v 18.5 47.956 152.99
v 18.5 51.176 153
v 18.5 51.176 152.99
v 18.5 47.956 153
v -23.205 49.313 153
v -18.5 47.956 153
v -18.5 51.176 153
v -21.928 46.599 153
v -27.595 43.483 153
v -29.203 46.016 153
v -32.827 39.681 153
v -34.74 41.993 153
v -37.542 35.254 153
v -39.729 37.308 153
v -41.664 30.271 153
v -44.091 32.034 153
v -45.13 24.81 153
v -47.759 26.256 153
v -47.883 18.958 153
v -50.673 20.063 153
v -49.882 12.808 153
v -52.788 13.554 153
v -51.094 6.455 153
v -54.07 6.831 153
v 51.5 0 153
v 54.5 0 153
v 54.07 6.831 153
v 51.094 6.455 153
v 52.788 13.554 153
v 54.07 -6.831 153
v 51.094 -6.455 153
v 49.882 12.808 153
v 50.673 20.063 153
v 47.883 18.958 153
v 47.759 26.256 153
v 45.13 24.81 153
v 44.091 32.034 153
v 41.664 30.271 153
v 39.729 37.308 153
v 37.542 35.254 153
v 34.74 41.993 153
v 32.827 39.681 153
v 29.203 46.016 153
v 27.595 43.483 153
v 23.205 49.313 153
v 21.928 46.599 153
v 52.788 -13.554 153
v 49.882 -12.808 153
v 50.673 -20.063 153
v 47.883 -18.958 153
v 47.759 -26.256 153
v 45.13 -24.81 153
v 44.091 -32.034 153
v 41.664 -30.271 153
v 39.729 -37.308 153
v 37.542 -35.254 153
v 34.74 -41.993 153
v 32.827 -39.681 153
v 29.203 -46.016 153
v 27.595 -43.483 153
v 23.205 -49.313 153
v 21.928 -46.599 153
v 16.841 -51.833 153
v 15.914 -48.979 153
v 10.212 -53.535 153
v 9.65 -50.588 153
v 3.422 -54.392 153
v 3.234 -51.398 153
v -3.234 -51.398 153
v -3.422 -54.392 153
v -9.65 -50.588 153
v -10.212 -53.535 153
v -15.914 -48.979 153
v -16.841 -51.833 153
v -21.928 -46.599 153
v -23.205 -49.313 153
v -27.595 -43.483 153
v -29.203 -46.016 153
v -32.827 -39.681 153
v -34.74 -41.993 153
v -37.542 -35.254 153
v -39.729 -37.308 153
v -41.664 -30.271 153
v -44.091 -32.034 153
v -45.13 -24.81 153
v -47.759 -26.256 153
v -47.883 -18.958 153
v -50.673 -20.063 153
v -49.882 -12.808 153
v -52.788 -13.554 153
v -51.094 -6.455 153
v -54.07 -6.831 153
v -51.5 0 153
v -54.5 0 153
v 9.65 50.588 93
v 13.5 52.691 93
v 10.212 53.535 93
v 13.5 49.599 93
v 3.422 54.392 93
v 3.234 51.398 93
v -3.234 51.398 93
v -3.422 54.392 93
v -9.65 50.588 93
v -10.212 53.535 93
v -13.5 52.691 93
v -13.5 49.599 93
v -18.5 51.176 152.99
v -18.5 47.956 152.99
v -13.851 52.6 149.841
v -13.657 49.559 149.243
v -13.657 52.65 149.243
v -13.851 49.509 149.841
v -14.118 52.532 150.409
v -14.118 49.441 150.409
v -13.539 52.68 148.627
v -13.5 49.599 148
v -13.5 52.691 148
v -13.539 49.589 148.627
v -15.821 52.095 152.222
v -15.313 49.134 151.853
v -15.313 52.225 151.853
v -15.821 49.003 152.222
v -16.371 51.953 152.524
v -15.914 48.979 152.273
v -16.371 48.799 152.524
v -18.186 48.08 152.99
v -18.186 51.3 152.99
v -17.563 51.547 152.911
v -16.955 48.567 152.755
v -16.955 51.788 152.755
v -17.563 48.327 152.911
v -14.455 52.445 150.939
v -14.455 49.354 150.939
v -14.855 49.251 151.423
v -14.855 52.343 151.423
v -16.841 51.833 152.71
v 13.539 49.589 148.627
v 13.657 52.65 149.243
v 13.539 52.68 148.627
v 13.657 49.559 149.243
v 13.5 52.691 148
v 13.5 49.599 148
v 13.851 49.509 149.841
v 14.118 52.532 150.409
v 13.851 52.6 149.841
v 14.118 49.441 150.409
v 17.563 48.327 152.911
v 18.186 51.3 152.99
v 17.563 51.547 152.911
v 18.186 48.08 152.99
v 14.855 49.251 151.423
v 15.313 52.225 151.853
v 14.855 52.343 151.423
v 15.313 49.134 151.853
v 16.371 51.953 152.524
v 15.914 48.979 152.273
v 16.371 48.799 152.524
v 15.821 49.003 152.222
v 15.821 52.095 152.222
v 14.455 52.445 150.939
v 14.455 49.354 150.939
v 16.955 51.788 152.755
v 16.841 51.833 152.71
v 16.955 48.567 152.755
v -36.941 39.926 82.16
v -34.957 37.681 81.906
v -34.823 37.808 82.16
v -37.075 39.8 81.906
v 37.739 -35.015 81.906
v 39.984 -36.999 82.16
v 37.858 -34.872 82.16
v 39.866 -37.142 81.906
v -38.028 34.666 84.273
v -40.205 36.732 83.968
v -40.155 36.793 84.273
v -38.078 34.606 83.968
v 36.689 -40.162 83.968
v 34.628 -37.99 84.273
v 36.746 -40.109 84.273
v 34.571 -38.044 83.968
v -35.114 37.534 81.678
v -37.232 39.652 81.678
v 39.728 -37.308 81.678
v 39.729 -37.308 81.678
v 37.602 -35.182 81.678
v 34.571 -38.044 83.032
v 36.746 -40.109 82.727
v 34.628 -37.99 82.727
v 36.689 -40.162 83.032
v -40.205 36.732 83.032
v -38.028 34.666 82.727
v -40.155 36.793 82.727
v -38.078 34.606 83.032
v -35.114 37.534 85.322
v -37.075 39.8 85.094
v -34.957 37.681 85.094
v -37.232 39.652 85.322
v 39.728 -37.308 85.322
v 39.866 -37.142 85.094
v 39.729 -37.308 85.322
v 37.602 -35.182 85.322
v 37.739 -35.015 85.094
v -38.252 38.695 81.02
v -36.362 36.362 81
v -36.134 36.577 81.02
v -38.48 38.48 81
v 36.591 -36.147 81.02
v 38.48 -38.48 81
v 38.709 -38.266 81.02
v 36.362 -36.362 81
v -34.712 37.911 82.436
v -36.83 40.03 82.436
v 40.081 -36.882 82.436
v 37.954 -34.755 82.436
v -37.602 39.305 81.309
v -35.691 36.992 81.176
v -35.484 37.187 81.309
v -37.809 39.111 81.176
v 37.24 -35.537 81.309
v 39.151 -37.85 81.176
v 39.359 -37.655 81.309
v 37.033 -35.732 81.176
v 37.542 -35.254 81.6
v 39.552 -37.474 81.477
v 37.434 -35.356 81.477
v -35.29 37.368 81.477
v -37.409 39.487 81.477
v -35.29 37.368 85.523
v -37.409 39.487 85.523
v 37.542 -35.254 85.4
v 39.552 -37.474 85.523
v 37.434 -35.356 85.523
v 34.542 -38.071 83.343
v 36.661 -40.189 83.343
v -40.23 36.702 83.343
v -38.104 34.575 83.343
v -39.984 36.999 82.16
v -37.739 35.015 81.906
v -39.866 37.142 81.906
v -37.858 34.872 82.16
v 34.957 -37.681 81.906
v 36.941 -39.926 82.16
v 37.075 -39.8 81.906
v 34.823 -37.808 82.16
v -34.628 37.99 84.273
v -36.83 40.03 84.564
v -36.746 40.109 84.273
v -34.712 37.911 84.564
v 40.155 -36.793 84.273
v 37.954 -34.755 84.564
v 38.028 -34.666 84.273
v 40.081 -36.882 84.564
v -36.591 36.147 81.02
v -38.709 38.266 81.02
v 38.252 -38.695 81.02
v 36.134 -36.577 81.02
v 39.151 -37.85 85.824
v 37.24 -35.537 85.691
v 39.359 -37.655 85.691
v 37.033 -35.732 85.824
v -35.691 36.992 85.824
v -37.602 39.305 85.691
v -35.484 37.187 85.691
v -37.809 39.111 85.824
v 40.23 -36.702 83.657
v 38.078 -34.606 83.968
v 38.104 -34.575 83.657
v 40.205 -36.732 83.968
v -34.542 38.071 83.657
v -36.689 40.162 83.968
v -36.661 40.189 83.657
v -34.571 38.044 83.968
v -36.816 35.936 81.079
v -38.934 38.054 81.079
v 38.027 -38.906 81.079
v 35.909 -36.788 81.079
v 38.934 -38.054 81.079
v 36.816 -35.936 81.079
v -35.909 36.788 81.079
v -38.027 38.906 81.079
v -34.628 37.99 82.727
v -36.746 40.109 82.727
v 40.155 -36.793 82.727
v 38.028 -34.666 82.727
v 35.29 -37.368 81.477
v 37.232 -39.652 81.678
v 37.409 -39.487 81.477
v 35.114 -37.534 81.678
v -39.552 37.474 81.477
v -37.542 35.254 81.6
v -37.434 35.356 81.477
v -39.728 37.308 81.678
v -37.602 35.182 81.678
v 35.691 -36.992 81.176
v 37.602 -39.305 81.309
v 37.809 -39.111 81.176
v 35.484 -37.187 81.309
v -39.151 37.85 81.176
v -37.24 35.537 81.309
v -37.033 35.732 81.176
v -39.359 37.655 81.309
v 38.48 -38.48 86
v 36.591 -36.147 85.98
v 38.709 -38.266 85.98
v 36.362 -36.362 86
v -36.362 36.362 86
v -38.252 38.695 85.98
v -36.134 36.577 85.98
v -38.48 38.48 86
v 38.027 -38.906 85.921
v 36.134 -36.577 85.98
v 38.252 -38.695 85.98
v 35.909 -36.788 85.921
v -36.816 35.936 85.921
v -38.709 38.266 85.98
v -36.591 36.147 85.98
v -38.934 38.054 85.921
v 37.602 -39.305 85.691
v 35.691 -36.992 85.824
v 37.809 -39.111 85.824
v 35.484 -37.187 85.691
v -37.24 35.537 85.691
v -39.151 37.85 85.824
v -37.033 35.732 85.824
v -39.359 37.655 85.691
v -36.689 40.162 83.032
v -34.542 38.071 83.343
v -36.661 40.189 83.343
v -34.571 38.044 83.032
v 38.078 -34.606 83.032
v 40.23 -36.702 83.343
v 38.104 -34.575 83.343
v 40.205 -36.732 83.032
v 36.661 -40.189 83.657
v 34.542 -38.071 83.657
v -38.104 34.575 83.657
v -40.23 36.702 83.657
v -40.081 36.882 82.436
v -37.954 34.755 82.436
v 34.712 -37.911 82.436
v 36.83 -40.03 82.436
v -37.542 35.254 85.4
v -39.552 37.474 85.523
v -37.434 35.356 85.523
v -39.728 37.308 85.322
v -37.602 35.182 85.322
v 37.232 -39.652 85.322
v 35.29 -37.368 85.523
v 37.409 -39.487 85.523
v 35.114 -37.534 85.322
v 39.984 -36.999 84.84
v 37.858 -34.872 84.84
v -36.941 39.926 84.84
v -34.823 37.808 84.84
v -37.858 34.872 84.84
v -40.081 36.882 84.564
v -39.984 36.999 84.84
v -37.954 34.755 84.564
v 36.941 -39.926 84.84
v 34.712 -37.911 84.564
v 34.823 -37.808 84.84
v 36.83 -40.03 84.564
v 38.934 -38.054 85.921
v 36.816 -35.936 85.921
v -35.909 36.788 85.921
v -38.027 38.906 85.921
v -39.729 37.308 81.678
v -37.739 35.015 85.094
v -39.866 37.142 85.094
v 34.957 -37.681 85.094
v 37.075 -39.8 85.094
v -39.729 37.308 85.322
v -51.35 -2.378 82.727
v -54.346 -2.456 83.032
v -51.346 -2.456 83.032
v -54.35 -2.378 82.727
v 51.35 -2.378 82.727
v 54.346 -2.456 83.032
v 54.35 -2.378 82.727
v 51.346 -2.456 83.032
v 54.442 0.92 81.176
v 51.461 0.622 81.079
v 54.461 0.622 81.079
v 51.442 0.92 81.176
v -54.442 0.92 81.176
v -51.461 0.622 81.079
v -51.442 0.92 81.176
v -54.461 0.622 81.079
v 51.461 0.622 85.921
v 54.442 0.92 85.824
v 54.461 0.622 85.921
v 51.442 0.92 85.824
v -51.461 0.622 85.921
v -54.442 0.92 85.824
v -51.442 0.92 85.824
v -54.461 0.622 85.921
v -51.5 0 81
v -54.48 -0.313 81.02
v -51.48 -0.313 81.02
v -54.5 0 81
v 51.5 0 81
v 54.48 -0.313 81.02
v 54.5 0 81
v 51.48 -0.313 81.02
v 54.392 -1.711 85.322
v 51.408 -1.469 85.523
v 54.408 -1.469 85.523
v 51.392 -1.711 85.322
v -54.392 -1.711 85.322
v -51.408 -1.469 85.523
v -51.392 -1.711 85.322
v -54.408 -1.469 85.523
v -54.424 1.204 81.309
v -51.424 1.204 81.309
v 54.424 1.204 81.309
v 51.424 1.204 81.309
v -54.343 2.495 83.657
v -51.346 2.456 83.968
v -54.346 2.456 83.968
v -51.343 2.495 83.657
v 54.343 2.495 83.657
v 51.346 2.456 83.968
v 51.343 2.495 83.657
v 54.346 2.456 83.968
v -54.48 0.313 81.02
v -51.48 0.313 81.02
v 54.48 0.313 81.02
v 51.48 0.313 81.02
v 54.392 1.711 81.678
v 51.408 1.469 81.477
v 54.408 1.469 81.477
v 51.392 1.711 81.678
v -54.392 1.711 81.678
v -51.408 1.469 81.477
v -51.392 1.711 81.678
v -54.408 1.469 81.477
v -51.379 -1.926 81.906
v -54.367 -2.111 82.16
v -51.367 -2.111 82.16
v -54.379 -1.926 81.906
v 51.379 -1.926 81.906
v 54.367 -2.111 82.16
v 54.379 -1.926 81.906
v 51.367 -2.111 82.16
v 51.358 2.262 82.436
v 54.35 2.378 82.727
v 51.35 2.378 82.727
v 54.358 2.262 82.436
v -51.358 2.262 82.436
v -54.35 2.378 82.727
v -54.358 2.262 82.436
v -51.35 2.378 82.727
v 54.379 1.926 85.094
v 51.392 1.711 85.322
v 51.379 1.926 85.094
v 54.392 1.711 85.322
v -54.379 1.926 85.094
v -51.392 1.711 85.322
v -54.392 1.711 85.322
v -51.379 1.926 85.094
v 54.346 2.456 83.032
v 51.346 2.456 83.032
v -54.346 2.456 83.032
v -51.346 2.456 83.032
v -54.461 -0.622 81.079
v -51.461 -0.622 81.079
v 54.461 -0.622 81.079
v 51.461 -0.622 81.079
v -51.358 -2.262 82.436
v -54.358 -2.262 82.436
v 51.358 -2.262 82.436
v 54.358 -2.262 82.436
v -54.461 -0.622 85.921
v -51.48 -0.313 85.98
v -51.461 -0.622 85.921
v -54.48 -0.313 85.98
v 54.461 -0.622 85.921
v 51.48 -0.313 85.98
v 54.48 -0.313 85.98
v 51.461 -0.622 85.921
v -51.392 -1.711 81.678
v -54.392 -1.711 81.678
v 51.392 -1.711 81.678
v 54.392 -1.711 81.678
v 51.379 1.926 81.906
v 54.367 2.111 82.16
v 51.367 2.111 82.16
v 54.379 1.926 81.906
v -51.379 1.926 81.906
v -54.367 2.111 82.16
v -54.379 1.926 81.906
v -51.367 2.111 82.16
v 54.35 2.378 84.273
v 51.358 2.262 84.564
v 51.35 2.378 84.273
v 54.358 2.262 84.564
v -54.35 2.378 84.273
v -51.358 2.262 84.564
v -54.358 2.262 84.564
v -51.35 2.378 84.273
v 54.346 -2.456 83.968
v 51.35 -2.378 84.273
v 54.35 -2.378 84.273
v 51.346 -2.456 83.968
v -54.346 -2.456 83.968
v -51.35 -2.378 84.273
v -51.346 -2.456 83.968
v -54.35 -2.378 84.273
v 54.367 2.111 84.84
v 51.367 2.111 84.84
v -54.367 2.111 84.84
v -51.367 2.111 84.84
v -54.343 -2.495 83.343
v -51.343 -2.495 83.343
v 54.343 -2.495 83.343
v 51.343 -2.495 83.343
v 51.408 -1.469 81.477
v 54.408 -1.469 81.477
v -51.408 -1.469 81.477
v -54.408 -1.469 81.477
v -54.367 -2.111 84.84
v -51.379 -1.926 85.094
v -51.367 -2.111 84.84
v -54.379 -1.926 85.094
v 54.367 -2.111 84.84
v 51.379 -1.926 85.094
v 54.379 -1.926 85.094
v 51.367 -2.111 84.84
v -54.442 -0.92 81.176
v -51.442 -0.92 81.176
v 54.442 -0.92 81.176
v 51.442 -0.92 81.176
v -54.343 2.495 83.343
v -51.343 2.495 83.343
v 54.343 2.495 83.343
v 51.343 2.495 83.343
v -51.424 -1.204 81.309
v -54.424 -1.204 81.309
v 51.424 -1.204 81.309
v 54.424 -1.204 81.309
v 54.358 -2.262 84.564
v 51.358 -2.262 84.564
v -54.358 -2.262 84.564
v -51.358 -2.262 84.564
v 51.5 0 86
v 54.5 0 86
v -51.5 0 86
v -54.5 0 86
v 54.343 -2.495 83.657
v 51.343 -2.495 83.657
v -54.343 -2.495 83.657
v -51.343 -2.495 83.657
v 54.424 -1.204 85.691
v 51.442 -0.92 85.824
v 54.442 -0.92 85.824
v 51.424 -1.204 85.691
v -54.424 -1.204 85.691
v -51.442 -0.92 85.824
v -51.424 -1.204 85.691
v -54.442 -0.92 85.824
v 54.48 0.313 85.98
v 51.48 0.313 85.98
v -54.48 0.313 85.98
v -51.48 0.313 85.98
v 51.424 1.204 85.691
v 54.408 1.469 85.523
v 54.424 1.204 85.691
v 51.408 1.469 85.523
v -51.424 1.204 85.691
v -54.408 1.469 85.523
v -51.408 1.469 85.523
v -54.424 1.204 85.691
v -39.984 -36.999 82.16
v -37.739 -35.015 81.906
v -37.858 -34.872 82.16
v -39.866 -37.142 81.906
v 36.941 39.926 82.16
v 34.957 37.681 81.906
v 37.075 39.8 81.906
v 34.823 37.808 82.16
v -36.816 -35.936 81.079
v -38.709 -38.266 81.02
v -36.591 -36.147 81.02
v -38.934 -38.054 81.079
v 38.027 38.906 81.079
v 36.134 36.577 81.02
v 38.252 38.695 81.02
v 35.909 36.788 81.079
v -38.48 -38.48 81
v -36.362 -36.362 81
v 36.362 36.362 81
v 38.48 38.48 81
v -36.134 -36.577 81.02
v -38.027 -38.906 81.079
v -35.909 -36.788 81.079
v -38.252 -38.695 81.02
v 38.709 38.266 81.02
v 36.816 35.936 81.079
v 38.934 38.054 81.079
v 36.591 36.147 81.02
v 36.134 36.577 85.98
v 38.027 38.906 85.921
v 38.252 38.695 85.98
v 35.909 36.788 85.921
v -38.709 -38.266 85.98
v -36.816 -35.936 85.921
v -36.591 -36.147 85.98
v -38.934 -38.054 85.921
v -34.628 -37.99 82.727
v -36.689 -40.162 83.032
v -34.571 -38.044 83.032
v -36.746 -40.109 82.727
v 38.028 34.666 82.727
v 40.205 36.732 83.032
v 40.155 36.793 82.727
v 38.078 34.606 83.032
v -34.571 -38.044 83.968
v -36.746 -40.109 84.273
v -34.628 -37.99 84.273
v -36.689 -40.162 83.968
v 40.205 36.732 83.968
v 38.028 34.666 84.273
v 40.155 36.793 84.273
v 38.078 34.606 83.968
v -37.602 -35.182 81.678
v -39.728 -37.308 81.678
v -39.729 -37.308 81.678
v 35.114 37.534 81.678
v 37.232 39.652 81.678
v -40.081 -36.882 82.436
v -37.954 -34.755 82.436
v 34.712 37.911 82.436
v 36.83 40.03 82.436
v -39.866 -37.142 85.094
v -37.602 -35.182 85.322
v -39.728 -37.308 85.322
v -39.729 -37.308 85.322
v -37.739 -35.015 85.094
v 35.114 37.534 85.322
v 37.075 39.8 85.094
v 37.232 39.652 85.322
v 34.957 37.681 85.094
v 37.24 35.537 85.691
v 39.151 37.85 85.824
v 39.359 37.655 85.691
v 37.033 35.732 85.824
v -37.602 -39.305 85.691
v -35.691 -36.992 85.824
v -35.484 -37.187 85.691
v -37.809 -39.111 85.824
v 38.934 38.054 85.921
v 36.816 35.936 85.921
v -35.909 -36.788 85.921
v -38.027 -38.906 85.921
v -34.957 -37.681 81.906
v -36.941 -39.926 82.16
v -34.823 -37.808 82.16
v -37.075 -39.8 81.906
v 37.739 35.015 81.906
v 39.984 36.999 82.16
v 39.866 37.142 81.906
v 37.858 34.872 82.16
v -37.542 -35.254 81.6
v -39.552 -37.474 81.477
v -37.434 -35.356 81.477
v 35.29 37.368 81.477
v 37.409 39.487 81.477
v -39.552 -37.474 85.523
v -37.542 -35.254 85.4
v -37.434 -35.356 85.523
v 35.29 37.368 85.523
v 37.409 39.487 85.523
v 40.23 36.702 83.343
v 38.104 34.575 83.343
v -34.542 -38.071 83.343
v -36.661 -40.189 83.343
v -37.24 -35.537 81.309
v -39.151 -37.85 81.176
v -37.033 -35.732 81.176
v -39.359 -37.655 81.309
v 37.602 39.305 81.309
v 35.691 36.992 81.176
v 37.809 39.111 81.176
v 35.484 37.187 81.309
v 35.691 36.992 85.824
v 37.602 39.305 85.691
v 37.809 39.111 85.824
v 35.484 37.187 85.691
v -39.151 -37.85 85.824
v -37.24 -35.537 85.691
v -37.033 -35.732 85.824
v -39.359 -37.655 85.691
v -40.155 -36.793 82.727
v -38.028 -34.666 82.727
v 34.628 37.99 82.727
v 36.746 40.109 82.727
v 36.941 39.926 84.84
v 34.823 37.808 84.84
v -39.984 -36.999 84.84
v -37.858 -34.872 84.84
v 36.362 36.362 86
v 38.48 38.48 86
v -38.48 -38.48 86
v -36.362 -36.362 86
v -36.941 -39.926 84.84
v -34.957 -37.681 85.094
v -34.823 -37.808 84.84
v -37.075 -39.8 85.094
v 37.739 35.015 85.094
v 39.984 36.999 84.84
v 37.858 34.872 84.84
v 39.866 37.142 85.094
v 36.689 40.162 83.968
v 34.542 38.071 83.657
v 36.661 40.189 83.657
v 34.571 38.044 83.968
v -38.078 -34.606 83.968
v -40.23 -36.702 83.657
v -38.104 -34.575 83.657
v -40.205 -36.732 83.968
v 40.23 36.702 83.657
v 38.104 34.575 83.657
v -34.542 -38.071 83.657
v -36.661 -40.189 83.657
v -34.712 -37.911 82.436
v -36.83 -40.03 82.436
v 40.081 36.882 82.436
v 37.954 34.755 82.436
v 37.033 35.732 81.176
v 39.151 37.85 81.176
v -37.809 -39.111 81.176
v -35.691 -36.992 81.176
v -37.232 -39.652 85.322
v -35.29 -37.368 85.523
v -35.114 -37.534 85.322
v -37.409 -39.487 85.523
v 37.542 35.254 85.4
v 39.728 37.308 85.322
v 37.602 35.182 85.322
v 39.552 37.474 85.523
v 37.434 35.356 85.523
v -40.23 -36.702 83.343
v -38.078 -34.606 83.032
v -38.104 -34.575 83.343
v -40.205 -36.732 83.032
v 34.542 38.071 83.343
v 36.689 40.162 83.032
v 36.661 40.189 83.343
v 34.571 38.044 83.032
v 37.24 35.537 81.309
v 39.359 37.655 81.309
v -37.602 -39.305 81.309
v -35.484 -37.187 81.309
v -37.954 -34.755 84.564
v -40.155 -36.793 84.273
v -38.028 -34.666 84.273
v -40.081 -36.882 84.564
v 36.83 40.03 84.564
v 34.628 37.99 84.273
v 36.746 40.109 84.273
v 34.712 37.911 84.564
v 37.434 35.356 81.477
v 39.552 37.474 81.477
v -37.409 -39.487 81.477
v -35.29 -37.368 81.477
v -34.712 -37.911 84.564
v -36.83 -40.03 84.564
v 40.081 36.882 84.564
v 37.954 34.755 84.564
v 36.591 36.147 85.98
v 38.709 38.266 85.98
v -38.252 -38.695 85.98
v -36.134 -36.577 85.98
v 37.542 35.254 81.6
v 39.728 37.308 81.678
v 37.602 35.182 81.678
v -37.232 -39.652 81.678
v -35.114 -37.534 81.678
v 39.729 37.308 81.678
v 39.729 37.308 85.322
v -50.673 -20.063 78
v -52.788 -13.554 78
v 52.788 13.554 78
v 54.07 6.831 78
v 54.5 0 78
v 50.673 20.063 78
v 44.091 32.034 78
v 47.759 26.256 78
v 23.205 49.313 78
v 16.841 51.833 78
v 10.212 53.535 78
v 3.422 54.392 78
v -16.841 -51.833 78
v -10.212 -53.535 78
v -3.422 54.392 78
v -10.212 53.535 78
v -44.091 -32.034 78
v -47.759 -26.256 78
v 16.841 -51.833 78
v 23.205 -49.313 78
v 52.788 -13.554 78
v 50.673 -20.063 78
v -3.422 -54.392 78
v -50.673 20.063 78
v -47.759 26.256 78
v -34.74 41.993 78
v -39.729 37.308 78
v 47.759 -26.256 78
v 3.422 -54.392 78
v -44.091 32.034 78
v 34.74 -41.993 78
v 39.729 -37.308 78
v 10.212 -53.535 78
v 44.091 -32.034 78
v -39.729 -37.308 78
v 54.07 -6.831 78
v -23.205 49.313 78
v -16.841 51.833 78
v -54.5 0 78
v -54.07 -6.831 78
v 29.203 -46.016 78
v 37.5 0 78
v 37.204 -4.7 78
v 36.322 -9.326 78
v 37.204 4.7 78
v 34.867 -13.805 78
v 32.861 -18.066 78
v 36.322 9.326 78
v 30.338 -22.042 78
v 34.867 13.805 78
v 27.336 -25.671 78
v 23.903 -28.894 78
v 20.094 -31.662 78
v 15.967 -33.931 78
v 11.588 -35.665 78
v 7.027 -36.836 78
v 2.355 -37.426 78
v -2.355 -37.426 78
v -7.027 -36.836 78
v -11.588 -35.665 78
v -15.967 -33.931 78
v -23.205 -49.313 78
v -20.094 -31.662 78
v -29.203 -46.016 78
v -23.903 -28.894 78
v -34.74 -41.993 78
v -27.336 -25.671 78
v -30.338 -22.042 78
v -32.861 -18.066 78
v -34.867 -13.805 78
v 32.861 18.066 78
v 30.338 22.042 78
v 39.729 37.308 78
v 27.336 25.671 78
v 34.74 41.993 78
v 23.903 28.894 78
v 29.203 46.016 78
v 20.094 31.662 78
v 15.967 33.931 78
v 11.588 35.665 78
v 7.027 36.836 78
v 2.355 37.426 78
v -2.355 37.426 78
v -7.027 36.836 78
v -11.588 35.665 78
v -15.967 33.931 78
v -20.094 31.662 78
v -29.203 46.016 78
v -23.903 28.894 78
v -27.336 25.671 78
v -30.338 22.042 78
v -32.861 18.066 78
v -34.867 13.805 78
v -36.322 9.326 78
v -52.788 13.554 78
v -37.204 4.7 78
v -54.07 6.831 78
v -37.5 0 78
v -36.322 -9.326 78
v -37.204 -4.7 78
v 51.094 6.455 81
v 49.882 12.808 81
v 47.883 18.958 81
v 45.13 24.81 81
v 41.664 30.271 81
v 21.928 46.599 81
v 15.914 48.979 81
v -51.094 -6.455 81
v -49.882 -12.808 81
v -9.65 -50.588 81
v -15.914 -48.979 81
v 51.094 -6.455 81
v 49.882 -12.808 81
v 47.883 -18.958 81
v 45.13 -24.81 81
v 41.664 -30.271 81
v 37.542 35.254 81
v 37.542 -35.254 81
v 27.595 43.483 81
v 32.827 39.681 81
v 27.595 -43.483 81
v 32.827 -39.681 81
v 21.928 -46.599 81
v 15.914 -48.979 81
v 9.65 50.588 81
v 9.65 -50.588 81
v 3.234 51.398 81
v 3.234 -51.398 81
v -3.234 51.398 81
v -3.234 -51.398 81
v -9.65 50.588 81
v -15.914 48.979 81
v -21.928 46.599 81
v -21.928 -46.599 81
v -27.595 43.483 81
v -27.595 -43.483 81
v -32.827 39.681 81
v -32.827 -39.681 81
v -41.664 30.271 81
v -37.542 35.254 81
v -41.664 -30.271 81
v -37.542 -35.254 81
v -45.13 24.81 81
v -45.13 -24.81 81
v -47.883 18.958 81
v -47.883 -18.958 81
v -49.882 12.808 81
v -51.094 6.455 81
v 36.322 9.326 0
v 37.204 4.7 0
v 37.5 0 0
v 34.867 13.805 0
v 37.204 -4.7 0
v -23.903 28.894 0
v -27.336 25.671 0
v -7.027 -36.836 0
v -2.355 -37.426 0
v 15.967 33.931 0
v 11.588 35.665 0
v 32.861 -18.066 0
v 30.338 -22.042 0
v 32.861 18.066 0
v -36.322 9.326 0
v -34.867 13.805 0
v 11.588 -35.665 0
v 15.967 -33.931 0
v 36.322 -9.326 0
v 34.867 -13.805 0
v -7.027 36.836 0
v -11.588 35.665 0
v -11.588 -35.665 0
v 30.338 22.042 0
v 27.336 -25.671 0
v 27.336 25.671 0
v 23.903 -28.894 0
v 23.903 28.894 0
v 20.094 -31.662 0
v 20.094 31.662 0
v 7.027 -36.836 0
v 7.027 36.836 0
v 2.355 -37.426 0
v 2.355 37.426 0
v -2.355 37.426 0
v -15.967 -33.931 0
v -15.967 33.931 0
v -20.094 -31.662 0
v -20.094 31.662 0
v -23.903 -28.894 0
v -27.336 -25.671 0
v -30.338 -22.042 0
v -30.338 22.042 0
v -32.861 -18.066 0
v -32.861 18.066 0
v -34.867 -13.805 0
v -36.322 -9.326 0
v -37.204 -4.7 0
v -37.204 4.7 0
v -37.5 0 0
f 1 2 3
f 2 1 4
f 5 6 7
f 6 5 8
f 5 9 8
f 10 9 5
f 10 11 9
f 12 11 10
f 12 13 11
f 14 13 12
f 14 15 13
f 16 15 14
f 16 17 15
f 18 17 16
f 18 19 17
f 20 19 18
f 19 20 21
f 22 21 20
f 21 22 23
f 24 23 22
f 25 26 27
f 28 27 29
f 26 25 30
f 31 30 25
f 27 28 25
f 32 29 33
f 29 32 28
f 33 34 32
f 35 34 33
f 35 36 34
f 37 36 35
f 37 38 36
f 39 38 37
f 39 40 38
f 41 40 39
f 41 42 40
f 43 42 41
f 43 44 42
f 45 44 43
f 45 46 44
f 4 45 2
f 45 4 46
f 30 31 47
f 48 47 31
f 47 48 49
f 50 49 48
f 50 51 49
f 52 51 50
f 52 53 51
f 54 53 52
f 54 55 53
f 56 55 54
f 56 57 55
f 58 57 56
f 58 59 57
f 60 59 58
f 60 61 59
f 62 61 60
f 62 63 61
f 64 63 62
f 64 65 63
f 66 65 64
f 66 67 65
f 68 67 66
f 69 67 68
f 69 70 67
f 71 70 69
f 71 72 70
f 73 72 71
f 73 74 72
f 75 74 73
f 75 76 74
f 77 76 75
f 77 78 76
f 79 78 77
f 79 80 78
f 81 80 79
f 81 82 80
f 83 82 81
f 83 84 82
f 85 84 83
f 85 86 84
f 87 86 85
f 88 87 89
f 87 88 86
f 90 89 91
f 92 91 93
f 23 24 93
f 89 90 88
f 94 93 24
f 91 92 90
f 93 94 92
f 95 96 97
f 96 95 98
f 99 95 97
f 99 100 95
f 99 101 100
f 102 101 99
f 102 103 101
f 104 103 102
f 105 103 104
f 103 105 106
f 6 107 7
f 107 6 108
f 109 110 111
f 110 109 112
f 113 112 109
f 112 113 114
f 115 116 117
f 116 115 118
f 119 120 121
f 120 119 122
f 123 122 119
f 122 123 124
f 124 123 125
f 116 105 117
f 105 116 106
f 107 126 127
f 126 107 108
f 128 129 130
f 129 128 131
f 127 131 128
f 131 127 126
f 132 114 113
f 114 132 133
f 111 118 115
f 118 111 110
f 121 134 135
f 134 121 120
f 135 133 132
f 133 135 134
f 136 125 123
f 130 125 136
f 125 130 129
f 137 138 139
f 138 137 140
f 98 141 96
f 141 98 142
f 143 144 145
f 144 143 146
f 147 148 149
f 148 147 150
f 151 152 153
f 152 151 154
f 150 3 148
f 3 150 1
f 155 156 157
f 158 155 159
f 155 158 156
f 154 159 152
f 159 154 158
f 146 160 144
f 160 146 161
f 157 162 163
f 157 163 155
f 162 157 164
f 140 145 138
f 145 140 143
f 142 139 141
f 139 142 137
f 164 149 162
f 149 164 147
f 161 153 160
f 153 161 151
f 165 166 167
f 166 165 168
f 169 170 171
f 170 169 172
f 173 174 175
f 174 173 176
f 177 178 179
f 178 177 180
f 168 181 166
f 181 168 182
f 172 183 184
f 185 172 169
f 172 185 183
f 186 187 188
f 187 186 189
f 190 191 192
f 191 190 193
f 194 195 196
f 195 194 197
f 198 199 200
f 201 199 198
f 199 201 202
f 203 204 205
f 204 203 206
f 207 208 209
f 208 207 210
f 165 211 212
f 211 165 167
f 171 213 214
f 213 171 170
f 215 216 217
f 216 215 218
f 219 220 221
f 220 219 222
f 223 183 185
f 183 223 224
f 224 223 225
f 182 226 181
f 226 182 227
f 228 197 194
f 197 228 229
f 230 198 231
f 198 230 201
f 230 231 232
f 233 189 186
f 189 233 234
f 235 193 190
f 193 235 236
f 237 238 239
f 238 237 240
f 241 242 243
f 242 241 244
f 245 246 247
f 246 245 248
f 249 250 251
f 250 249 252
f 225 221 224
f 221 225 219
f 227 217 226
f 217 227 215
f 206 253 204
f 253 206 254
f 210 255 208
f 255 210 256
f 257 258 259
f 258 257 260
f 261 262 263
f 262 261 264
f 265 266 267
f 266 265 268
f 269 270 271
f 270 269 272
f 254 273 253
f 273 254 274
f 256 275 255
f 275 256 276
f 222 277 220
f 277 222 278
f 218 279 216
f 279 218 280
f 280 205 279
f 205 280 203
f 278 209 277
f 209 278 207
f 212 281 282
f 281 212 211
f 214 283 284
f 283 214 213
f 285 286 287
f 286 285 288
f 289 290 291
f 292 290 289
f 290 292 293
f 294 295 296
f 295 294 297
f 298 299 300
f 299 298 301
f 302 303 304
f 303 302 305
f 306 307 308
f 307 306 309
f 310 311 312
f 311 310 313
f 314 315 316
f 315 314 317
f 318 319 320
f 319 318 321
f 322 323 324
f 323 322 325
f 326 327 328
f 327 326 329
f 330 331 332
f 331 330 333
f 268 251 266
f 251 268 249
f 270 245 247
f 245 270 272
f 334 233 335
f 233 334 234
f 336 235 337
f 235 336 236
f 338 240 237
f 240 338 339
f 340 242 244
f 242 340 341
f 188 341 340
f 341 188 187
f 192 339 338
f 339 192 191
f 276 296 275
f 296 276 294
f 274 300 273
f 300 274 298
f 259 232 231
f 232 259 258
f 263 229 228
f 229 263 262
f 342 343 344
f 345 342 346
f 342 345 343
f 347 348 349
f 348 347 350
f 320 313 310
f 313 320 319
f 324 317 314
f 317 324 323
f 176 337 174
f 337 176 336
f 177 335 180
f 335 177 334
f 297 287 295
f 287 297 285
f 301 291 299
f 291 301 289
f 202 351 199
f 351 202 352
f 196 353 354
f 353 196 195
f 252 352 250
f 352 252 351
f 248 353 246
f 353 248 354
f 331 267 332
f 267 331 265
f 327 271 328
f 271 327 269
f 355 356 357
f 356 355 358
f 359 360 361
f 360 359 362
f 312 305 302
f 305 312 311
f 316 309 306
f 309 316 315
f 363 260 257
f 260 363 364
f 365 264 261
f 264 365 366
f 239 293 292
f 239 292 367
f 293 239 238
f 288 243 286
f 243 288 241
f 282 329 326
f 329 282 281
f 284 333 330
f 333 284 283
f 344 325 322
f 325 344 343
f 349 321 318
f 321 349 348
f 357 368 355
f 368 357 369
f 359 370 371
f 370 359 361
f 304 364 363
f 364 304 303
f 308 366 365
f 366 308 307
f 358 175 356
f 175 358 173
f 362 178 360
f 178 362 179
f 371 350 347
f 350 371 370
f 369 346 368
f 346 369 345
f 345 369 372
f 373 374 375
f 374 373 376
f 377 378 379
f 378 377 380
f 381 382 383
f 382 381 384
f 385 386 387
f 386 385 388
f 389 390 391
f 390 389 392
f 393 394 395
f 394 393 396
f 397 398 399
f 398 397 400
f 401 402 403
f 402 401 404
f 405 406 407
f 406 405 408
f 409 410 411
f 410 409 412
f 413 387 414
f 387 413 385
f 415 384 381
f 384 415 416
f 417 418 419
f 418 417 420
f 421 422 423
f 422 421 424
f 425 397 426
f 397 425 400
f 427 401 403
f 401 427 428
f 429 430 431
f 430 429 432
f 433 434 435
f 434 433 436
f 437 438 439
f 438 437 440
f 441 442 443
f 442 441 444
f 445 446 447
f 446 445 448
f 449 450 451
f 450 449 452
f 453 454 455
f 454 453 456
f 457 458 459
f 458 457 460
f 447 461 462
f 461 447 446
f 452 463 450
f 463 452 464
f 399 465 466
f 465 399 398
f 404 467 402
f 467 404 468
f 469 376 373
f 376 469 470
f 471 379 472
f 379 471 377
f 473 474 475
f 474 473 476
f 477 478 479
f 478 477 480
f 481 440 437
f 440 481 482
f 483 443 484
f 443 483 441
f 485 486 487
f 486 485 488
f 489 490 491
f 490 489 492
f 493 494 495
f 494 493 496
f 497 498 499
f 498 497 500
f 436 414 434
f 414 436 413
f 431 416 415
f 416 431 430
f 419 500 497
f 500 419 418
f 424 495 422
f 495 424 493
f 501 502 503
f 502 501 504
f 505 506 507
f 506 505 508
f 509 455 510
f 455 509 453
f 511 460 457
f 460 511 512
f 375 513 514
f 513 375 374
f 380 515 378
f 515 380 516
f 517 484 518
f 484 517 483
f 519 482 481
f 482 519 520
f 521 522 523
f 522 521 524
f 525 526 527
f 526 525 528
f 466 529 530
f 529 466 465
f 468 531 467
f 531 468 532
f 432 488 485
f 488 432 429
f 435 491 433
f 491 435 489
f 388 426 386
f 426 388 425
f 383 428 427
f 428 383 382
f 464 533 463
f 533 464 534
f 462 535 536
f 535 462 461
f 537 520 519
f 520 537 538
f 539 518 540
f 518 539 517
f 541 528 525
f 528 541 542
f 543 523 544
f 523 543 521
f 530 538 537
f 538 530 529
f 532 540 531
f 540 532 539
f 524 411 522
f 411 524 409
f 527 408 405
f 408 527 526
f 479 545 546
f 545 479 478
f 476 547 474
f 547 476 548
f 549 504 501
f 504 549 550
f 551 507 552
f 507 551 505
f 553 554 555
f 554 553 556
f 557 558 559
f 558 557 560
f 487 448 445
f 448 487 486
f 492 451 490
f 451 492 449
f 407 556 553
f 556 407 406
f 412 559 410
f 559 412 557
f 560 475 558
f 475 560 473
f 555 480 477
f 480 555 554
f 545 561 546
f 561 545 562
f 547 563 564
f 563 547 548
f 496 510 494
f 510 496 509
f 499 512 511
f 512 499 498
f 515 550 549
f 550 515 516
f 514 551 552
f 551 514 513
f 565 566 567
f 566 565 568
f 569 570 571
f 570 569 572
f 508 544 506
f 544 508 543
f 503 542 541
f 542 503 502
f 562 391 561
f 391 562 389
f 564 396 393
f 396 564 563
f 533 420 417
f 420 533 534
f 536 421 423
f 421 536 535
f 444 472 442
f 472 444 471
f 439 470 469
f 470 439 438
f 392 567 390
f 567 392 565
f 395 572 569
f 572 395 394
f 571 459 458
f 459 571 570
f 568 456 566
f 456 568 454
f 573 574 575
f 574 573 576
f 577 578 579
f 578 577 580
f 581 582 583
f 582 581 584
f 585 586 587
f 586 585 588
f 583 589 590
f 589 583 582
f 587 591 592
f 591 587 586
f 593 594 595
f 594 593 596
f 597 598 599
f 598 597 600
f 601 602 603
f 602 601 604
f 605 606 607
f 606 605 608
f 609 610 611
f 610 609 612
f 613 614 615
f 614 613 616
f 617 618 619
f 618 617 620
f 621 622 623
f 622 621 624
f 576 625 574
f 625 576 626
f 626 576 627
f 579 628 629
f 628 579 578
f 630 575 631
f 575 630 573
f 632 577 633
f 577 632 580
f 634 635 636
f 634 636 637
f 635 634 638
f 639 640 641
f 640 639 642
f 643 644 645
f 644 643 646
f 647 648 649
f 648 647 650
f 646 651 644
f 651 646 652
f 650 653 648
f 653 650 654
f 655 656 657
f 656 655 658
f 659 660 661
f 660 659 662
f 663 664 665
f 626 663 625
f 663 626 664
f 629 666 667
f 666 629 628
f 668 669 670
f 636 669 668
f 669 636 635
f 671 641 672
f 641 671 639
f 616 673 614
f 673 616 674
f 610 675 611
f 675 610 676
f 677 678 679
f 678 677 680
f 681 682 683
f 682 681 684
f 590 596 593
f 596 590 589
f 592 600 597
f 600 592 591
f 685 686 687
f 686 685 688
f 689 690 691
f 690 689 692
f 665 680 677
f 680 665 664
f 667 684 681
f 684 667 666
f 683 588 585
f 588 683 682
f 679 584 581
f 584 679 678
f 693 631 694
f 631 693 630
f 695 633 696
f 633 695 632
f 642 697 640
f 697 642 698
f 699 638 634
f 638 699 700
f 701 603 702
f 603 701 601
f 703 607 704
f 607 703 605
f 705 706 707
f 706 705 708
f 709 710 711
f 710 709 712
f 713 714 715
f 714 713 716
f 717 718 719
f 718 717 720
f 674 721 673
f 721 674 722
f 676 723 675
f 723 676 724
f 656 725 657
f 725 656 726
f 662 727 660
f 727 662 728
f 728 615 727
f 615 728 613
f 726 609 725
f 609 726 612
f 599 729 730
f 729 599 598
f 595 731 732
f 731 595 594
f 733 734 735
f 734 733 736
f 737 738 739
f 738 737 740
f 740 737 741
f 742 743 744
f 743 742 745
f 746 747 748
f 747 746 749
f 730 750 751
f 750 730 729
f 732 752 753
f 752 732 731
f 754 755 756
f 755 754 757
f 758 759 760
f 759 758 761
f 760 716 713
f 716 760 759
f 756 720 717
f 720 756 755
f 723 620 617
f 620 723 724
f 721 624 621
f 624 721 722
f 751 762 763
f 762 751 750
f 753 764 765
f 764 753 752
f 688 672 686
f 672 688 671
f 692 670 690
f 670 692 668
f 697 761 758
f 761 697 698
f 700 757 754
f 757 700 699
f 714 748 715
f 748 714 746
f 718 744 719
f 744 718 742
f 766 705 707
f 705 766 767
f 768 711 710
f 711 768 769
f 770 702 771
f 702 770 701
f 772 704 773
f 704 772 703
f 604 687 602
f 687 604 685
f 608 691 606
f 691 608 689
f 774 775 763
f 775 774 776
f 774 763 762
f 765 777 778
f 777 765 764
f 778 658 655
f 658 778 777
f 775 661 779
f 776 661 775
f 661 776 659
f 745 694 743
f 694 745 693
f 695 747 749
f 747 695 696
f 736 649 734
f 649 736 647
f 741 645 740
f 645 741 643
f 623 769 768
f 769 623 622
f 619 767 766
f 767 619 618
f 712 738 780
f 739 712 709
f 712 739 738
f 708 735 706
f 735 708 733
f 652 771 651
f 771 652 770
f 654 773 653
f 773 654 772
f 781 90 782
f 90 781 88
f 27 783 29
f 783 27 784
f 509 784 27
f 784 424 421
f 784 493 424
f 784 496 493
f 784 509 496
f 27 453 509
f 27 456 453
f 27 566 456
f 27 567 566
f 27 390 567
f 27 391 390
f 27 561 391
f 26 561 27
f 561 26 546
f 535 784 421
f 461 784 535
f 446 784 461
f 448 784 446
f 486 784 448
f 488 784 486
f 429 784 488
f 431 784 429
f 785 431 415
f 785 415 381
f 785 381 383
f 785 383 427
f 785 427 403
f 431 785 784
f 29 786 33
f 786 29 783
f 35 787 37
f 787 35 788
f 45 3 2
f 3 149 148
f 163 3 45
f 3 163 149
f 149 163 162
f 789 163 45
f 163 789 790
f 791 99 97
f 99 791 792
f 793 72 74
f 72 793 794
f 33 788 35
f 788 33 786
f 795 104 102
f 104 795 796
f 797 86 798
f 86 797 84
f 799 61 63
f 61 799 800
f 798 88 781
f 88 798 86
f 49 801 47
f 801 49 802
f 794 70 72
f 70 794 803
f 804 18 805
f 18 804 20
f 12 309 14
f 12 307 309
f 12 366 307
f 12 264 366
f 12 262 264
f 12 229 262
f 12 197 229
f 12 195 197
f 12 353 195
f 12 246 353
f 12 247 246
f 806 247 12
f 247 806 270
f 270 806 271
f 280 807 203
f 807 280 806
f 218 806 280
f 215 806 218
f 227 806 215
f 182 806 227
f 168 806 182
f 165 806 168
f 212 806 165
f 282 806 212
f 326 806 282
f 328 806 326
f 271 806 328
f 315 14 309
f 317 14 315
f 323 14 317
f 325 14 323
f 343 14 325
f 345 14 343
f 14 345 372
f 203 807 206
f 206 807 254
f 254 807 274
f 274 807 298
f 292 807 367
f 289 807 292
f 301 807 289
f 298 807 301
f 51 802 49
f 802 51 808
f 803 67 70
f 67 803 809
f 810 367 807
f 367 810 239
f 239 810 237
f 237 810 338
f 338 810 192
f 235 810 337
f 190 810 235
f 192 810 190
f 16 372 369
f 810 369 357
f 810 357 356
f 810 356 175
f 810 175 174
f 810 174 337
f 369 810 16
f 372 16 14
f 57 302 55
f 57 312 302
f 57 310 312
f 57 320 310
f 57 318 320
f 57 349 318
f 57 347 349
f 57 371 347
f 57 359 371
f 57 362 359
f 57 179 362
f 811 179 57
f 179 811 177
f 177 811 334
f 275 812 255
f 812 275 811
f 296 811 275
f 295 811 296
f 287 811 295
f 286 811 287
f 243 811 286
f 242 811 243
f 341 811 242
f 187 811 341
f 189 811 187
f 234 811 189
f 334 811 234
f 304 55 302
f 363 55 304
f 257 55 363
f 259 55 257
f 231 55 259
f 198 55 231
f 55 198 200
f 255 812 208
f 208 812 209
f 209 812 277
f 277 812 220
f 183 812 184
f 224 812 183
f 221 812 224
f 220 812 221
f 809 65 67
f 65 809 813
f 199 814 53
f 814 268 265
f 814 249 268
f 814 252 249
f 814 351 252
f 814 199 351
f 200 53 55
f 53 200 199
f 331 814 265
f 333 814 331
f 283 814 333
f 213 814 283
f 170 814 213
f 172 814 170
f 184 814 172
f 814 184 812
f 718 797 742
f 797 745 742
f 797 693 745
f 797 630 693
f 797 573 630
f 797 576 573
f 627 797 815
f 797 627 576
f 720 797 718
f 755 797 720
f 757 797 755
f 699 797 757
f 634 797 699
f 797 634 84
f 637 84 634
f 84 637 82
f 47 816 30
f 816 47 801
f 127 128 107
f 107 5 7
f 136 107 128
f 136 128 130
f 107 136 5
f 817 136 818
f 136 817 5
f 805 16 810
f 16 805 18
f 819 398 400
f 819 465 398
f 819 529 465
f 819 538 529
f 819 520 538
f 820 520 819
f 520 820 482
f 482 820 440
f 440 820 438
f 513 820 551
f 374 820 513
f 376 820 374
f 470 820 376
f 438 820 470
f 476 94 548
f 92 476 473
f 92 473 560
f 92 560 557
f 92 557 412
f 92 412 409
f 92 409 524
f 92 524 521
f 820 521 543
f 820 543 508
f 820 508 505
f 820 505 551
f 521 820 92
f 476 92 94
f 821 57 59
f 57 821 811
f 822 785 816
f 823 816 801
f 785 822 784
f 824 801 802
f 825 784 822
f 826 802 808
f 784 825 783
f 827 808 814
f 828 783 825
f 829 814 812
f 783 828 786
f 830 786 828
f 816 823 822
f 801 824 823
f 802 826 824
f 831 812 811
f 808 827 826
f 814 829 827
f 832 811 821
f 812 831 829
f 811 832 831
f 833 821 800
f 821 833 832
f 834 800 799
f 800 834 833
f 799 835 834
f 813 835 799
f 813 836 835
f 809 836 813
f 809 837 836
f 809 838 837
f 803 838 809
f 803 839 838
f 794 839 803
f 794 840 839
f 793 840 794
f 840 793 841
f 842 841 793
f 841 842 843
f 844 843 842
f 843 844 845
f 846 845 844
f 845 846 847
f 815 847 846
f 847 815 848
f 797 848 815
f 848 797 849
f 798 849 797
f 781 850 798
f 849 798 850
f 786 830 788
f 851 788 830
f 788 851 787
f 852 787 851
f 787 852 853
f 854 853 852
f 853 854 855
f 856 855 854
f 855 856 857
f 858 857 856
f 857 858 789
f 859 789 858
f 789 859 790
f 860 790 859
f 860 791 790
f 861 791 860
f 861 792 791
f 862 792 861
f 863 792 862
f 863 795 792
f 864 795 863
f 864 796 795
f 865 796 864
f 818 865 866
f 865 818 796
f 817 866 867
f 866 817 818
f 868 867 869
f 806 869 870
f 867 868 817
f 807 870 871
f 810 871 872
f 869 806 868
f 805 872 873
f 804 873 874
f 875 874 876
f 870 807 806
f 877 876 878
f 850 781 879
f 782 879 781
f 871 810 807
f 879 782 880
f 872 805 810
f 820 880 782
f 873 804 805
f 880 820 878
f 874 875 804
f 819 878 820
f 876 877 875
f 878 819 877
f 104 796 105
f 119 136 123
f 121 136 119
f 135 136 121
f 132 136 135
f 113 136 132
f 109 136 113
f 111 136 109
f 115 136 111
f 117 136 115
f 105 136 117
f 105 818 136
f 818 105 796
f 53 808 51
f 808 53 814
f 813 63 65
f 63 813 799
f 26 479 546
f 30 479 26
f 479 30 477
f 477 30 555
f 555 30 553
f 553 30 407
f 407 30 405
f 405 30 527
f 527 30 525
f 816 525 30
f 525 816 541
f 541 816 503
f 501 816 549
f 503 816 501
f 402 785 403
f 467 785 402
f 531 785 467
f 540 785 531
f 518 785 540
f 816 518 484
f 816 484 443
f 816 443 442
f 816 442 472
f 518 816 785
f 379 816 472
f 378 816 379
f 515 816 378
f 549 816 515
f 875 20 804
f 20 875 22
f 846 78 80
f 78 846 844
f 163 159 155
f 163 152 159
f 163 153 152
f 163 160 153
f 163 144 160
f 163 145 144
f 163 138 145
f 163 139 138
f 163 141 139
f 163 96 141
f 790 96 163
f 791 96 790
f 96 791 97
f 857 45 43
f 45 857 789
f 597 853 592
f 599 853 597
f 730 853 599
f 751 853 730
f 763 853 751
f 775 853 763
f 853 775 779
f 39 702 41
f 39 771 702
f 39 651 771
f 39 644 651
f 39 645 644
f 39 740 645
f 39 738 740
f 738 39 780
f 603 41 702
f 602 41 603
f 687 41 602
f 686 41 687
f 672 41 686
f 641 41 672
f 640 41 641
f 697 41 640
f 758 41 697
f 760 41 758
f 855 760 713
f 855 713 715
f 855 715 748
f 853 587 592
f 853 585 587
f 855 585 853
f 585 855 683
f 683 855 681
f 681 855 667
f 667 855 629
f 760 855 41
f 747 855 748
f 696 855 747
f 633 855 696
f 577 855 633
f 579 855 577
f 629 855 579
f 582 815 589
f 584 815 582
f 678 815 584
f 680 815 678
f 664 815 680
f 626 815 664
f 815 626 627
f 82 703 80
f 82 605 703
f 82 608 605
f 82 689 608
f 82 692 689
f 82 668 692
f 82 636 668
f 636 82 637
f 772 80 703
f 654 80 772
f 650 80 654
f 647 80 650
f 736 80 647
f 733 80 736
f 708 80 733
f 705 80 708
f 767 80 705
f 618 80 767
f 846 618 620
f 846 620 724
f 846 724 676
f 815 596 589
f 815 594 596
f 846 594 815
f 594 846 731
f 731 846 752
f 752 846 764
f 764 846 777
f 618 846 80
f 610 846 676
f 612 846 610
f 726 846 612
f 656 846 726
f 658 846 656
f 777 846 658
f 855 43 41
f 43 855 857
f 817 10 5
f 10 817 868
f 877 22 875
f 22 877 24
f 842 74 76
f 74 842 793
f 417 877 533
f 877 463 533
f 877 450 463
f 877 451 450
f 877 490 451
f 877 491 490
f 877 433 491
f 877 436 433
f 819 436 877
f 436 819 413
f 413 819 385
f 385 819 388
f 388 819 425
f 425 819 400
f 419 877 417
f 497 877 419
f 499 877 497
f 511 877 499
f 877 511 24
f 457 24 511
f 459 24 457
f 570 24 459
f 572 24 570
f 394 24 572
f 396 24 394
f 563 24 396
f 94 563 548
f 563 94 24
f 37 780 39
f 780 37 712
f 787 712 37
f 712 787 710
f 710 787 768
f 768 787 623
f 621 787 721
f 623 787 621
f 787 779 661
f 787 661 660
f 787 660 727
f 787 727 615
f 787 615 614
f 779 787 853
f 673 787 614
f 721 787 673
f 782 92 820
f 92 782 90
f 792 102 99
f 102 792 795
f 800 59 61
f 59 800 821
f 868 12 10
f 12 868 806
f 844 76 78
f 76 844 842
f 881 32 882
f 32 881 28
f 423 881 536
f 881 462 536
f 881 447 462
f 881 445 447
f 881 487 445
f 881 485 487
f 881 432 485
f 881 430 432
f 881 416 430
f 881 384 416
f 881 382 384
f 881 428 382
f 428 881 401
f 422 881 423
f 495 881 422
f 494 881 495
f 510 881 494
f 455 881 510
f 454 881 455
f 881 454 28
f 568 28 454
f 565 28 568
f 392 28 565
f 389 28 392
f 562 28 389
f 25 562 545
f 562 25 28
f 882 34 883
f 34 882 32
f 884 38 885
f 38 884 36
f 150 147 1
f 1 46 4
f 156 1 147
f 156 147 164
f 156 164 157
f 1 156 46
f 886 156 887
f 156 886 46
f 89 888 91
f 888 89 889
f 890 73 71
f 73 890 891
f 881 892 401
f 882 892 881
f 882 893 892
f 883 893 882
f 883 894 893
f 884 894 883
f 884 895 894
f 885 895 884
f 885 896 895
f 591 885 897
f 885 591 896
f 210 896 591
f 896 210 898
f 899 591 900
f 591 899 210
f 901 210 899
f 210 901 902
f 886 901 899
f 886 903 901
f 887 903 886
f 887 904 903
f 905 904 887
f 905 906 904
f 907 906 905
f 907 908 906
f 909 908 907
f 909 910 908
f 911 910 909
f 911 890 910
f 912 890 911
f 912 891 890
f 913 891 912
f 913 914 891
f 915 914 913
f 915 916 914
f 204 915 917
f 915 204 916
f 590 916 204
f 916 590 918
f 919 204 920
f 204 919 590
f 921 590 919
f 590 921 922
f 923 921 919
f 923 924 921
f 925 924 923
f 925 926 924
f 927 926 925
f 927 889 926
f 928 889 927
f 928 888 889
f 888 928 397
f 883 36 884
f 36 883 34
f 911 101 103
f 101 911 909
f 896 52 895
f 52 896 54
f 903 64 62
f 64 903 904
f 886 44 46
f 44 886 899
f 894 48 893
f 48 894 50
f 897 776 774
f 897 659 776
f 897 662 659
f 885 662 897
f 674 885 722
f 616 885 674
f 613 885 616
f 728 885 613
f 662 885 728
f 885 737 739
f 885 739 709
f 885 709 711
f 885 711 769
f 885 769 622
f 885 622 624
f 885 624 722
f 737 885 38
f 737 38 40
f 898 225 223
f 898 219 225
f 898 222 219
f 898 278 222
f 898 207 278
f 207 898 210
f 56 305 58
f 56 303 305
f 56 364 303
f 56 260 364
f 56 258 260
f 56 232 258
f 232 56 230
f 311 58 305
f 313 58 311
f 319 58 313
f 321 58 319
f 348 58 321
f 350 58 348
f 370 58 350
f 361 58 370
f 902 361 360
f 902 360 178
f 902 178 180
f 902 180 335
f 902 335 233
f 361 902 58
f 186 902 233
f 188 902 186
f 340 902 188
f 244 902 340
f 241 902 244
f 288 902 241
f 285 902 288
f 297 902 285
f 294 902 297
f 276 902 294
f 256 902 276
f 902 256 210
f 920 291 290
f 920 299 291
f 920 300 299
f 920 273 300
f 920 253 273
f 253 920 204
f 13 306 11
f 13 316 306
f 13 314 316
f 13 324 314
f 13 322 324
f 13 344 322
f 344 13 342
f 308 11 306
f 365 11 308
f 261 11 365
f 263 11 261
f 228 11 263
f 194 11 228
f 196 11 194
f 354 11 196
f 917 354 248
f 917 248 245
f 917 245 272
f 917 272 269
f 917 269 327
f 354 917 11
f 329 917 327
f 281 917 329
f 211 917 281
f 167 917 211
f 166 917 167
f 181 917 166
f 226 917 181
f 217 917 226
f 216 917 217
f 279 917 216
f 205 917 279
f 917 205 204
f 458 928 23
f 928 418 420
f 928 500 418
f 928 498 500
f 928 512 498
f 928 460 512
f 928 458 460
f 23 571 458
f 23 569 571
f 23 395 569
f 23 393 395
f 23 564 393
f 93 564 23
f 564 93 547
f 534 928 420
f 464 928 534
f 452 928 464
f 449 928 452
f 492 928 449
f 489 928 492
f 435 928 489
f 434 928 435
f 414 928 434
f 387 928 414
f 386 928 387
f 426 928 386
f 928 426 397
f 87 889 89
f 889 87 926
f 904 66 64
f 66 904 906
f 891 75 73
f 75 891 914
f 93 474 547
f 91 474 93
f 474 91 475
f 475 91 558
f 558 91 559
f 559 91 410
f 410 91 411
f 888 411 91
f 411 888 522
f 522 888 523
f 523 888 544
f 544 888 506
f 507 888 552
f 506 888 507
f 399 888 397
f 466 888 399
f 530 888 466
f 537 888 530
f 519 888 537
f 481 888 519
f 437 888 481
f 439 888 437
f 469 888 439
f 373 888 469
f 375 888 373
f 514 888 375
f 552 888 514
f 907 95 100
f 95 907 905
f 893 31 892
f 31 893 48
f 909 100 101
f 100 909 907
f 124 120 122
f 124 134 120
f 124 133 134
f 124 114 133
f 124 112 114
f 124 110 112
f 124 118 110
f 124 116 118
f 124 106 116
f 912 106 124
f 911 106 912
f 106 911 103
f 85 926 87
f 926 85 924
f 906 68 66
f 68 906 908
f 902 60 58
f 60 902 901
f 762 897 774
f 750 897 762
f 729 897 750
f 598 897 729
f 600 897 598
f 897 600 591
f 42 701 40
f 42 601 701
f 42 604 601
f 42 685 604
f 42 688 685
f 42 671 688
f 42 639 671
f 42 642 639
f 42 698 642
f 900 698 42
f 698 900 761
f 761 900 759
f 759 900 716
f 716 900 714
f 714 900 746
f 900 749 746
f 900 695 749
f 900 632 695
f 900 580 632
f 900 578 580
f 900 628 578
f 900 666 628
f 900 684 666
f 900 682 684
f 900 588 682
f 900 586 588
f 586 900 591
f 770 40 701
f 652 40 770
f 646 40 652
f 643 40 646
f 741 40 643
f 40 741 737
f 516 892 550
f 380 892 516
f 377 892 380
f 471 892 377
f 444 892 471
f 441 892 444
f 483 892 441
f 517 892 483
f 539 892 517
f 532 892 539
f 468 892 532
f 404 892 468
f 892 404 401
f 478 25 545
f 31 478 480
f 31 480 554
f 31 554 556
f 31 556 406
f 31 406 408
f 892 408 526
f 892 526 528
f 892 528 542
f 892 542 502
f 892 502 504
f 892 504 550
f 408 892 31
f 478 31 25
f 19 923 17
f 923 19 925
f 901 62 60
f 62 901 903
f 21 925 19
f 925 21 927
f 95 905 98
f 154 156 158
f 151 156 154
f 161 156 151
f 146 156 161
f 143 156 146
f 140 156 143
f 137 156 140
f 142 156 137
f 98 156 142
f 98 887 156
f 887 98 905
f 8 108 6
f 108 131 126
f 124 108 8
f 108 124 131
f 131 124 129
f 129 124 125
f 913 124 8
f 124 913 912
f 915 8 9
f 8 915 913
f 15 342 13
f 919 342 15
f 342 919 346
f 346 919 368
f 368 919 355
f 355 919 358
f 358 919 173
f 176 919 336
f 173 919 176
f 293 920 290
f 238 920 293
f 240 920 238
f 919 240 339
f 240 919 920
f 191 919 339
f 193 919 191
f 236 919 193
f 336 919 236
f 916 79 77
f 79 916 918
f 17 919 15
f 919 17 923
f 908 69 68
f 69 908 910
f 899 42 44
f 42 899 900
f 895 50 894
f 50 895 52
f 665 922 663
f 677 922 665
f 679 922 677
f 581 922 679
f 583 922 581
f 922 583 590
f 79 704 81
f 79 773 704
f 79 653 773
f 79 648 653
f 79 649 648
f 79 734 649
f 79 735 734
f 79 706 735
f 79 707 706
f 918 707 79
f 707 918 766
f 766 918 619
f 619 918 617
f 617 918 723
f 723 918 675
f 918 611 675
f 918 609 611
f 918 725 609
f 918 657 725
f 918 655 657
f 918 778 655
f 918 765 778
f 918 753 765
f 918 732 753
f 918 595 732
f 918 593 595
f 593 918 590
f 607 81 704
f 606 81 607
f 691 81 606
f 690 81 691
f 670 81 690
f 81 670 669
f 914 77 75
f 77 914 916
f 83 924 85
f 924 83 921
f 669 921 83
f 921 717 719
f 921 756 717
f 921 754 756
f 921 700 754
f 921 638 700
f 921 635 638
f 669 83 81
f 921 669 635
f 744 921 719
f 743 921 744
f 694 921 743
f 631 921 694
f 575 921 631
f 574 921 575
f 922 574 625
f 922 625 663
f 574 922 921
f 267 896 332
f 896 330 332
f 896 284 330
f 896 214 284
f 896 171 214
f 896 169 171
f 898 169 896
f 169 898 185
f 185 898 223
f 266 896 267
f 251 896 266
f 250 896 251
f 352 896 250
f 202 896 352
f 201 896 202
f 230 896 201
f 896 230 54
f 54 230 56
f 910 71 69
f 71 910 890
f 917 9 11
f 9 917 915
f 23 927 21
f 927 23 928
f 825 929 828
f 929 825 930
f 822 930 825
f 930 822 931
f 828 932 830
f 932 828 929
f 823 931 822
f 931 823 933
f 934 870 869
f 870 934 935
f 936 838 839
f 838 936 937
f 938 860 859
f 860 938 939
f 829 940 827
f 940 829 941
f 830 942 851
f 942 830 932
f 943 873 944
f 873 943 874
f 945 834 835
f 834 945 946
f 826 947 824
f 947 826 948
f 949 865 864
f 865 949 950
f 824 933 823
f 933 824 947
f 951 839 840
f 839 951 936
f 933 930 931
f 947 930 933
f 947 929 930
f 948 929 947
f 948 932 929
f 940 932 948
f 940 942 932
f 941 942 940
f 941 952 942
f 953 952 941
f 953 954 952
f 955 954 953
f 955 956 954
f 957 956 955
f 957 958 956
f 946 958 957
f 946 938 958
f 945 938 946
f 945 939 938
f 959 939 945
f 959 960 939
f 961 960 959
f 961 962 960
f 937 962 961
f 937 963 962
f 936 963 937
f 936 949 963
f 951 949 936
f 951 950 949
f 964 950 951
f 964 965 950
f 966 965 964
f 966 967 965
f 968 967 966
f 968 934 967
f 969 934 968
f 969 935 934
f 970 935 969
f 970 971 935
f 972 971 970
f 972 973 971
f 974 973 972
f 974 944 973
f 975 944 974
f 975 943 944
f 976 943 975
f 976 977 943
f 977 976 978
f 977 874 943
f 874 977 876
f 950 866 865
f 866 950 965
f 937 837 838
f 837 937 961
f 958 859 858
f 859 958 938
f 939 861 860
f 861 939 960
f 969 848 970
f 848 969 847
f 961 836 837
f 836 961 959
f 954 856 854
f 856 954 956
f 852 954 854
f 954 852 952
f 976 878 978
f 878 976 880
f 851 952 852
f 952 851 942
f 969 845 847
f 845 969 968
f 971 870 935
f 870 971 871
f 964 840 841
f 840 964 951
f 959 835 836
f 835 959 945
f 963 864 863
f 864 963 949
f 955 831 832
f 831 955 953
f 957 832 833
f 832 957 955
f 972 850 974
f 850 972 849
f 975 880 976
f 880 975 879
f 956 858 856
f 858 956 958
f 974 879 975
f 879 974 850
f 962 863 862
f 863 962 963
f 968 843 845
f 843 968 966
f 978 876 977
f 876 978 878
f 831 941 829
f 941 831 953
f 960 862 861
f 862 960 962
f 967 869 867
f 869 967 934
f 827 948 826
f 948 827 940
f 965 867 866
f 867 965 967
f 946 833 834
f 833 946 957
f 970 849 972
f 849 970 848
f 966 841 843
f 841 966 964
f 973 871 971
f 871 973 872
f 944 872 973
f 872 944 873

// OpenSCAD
$fn = 50;

yeti_od = 103;  // Yeti mug outer diameter in mm.
yeti_handle_width = 22;  // Yeti handle width in mm.
yeti_handle_height = 15;  // Distance from base to bottom of handle on Yeti mug in mm.

cup_holder_diameter = 75;  // Minimum diameter of cup holder in mm.
cup_holder_depth = 78;  // Depth of cup holder in mm.

wall_width = 3;  // Wall thickness in mm.
yeti_holder_height = 75; // Height of part that holds the Yeti mug in mm.
yeti_handle_slot_width = yeti_handle_width + 5;

vent_diameter = 5;

module handle_cutout_negative(w, d, h, r) {
    rotate([90, 0, 0]) {
        translate([r, 0, -d]) {
            minkowski() {
                cube([w, h - r, d / 2]);
                cylinder(r=r, h=d / 2);
            }
        }
    }
}

module handle_cutout() {
    radius_of_curvature = 5;
    h = yeti_holder_height - yeti_handle_height;
    w = yeti_handle_slot_width + (2 * radius_of_curvature);
    d = wall_width * 4;

    translate([-w / 2, 0, 0]) {
        difference() {
            cube([w, d, h]);
            translate([-(w + radius_of_curvature), 0, 0]) {
                handle_cutout_negative(w, d, h, radius_of_curvature);
            }
            translate([w - radius_of_curvature, 0, 0]) {
                handle_cutout_negative(w, d, h, radius_of_curvature);
            }
        }
    }
}

module vent() {
    h = yeti_od + 2 * wall_width;
    translate([-h / 2, 0, 0]) {
        rotate([0, 90, 0]) {
            cylinder(yeti_od + 2 * wall_width, d=vent_diameter);
        }
    }
}

module vents() {
    translate([0, 0, vent_diameter / 2]) {
        for (degs = [-45:45:45]) {
            rotate([0, 0, degs]) {
                vent();
            }
        }
    }
}

module yeti_holder() {
    difference() {
        cylinder(yeti_holder_height, d=(yeti_od + (2 * wall_width)));
        translate([0, 0, wall_width]) {
            cylinder(yeti_holder_height, d=(yeti_od));
        }
        translate([0, (yeti_od - (4 * wall_width)) / 2, yeti_handle_height]) {
            handle_cutout();
        }
        translate([0, 0, wall_width]) {
            vents();
        }
    }
}

module cup_holder_insert() {
    cylinder(cup_holder_depth, d=cup_holder_diameter);
}

cup_holder_insert();
translate([0, 0, cup_holder_depth]) {
    yeti_holder();
};
